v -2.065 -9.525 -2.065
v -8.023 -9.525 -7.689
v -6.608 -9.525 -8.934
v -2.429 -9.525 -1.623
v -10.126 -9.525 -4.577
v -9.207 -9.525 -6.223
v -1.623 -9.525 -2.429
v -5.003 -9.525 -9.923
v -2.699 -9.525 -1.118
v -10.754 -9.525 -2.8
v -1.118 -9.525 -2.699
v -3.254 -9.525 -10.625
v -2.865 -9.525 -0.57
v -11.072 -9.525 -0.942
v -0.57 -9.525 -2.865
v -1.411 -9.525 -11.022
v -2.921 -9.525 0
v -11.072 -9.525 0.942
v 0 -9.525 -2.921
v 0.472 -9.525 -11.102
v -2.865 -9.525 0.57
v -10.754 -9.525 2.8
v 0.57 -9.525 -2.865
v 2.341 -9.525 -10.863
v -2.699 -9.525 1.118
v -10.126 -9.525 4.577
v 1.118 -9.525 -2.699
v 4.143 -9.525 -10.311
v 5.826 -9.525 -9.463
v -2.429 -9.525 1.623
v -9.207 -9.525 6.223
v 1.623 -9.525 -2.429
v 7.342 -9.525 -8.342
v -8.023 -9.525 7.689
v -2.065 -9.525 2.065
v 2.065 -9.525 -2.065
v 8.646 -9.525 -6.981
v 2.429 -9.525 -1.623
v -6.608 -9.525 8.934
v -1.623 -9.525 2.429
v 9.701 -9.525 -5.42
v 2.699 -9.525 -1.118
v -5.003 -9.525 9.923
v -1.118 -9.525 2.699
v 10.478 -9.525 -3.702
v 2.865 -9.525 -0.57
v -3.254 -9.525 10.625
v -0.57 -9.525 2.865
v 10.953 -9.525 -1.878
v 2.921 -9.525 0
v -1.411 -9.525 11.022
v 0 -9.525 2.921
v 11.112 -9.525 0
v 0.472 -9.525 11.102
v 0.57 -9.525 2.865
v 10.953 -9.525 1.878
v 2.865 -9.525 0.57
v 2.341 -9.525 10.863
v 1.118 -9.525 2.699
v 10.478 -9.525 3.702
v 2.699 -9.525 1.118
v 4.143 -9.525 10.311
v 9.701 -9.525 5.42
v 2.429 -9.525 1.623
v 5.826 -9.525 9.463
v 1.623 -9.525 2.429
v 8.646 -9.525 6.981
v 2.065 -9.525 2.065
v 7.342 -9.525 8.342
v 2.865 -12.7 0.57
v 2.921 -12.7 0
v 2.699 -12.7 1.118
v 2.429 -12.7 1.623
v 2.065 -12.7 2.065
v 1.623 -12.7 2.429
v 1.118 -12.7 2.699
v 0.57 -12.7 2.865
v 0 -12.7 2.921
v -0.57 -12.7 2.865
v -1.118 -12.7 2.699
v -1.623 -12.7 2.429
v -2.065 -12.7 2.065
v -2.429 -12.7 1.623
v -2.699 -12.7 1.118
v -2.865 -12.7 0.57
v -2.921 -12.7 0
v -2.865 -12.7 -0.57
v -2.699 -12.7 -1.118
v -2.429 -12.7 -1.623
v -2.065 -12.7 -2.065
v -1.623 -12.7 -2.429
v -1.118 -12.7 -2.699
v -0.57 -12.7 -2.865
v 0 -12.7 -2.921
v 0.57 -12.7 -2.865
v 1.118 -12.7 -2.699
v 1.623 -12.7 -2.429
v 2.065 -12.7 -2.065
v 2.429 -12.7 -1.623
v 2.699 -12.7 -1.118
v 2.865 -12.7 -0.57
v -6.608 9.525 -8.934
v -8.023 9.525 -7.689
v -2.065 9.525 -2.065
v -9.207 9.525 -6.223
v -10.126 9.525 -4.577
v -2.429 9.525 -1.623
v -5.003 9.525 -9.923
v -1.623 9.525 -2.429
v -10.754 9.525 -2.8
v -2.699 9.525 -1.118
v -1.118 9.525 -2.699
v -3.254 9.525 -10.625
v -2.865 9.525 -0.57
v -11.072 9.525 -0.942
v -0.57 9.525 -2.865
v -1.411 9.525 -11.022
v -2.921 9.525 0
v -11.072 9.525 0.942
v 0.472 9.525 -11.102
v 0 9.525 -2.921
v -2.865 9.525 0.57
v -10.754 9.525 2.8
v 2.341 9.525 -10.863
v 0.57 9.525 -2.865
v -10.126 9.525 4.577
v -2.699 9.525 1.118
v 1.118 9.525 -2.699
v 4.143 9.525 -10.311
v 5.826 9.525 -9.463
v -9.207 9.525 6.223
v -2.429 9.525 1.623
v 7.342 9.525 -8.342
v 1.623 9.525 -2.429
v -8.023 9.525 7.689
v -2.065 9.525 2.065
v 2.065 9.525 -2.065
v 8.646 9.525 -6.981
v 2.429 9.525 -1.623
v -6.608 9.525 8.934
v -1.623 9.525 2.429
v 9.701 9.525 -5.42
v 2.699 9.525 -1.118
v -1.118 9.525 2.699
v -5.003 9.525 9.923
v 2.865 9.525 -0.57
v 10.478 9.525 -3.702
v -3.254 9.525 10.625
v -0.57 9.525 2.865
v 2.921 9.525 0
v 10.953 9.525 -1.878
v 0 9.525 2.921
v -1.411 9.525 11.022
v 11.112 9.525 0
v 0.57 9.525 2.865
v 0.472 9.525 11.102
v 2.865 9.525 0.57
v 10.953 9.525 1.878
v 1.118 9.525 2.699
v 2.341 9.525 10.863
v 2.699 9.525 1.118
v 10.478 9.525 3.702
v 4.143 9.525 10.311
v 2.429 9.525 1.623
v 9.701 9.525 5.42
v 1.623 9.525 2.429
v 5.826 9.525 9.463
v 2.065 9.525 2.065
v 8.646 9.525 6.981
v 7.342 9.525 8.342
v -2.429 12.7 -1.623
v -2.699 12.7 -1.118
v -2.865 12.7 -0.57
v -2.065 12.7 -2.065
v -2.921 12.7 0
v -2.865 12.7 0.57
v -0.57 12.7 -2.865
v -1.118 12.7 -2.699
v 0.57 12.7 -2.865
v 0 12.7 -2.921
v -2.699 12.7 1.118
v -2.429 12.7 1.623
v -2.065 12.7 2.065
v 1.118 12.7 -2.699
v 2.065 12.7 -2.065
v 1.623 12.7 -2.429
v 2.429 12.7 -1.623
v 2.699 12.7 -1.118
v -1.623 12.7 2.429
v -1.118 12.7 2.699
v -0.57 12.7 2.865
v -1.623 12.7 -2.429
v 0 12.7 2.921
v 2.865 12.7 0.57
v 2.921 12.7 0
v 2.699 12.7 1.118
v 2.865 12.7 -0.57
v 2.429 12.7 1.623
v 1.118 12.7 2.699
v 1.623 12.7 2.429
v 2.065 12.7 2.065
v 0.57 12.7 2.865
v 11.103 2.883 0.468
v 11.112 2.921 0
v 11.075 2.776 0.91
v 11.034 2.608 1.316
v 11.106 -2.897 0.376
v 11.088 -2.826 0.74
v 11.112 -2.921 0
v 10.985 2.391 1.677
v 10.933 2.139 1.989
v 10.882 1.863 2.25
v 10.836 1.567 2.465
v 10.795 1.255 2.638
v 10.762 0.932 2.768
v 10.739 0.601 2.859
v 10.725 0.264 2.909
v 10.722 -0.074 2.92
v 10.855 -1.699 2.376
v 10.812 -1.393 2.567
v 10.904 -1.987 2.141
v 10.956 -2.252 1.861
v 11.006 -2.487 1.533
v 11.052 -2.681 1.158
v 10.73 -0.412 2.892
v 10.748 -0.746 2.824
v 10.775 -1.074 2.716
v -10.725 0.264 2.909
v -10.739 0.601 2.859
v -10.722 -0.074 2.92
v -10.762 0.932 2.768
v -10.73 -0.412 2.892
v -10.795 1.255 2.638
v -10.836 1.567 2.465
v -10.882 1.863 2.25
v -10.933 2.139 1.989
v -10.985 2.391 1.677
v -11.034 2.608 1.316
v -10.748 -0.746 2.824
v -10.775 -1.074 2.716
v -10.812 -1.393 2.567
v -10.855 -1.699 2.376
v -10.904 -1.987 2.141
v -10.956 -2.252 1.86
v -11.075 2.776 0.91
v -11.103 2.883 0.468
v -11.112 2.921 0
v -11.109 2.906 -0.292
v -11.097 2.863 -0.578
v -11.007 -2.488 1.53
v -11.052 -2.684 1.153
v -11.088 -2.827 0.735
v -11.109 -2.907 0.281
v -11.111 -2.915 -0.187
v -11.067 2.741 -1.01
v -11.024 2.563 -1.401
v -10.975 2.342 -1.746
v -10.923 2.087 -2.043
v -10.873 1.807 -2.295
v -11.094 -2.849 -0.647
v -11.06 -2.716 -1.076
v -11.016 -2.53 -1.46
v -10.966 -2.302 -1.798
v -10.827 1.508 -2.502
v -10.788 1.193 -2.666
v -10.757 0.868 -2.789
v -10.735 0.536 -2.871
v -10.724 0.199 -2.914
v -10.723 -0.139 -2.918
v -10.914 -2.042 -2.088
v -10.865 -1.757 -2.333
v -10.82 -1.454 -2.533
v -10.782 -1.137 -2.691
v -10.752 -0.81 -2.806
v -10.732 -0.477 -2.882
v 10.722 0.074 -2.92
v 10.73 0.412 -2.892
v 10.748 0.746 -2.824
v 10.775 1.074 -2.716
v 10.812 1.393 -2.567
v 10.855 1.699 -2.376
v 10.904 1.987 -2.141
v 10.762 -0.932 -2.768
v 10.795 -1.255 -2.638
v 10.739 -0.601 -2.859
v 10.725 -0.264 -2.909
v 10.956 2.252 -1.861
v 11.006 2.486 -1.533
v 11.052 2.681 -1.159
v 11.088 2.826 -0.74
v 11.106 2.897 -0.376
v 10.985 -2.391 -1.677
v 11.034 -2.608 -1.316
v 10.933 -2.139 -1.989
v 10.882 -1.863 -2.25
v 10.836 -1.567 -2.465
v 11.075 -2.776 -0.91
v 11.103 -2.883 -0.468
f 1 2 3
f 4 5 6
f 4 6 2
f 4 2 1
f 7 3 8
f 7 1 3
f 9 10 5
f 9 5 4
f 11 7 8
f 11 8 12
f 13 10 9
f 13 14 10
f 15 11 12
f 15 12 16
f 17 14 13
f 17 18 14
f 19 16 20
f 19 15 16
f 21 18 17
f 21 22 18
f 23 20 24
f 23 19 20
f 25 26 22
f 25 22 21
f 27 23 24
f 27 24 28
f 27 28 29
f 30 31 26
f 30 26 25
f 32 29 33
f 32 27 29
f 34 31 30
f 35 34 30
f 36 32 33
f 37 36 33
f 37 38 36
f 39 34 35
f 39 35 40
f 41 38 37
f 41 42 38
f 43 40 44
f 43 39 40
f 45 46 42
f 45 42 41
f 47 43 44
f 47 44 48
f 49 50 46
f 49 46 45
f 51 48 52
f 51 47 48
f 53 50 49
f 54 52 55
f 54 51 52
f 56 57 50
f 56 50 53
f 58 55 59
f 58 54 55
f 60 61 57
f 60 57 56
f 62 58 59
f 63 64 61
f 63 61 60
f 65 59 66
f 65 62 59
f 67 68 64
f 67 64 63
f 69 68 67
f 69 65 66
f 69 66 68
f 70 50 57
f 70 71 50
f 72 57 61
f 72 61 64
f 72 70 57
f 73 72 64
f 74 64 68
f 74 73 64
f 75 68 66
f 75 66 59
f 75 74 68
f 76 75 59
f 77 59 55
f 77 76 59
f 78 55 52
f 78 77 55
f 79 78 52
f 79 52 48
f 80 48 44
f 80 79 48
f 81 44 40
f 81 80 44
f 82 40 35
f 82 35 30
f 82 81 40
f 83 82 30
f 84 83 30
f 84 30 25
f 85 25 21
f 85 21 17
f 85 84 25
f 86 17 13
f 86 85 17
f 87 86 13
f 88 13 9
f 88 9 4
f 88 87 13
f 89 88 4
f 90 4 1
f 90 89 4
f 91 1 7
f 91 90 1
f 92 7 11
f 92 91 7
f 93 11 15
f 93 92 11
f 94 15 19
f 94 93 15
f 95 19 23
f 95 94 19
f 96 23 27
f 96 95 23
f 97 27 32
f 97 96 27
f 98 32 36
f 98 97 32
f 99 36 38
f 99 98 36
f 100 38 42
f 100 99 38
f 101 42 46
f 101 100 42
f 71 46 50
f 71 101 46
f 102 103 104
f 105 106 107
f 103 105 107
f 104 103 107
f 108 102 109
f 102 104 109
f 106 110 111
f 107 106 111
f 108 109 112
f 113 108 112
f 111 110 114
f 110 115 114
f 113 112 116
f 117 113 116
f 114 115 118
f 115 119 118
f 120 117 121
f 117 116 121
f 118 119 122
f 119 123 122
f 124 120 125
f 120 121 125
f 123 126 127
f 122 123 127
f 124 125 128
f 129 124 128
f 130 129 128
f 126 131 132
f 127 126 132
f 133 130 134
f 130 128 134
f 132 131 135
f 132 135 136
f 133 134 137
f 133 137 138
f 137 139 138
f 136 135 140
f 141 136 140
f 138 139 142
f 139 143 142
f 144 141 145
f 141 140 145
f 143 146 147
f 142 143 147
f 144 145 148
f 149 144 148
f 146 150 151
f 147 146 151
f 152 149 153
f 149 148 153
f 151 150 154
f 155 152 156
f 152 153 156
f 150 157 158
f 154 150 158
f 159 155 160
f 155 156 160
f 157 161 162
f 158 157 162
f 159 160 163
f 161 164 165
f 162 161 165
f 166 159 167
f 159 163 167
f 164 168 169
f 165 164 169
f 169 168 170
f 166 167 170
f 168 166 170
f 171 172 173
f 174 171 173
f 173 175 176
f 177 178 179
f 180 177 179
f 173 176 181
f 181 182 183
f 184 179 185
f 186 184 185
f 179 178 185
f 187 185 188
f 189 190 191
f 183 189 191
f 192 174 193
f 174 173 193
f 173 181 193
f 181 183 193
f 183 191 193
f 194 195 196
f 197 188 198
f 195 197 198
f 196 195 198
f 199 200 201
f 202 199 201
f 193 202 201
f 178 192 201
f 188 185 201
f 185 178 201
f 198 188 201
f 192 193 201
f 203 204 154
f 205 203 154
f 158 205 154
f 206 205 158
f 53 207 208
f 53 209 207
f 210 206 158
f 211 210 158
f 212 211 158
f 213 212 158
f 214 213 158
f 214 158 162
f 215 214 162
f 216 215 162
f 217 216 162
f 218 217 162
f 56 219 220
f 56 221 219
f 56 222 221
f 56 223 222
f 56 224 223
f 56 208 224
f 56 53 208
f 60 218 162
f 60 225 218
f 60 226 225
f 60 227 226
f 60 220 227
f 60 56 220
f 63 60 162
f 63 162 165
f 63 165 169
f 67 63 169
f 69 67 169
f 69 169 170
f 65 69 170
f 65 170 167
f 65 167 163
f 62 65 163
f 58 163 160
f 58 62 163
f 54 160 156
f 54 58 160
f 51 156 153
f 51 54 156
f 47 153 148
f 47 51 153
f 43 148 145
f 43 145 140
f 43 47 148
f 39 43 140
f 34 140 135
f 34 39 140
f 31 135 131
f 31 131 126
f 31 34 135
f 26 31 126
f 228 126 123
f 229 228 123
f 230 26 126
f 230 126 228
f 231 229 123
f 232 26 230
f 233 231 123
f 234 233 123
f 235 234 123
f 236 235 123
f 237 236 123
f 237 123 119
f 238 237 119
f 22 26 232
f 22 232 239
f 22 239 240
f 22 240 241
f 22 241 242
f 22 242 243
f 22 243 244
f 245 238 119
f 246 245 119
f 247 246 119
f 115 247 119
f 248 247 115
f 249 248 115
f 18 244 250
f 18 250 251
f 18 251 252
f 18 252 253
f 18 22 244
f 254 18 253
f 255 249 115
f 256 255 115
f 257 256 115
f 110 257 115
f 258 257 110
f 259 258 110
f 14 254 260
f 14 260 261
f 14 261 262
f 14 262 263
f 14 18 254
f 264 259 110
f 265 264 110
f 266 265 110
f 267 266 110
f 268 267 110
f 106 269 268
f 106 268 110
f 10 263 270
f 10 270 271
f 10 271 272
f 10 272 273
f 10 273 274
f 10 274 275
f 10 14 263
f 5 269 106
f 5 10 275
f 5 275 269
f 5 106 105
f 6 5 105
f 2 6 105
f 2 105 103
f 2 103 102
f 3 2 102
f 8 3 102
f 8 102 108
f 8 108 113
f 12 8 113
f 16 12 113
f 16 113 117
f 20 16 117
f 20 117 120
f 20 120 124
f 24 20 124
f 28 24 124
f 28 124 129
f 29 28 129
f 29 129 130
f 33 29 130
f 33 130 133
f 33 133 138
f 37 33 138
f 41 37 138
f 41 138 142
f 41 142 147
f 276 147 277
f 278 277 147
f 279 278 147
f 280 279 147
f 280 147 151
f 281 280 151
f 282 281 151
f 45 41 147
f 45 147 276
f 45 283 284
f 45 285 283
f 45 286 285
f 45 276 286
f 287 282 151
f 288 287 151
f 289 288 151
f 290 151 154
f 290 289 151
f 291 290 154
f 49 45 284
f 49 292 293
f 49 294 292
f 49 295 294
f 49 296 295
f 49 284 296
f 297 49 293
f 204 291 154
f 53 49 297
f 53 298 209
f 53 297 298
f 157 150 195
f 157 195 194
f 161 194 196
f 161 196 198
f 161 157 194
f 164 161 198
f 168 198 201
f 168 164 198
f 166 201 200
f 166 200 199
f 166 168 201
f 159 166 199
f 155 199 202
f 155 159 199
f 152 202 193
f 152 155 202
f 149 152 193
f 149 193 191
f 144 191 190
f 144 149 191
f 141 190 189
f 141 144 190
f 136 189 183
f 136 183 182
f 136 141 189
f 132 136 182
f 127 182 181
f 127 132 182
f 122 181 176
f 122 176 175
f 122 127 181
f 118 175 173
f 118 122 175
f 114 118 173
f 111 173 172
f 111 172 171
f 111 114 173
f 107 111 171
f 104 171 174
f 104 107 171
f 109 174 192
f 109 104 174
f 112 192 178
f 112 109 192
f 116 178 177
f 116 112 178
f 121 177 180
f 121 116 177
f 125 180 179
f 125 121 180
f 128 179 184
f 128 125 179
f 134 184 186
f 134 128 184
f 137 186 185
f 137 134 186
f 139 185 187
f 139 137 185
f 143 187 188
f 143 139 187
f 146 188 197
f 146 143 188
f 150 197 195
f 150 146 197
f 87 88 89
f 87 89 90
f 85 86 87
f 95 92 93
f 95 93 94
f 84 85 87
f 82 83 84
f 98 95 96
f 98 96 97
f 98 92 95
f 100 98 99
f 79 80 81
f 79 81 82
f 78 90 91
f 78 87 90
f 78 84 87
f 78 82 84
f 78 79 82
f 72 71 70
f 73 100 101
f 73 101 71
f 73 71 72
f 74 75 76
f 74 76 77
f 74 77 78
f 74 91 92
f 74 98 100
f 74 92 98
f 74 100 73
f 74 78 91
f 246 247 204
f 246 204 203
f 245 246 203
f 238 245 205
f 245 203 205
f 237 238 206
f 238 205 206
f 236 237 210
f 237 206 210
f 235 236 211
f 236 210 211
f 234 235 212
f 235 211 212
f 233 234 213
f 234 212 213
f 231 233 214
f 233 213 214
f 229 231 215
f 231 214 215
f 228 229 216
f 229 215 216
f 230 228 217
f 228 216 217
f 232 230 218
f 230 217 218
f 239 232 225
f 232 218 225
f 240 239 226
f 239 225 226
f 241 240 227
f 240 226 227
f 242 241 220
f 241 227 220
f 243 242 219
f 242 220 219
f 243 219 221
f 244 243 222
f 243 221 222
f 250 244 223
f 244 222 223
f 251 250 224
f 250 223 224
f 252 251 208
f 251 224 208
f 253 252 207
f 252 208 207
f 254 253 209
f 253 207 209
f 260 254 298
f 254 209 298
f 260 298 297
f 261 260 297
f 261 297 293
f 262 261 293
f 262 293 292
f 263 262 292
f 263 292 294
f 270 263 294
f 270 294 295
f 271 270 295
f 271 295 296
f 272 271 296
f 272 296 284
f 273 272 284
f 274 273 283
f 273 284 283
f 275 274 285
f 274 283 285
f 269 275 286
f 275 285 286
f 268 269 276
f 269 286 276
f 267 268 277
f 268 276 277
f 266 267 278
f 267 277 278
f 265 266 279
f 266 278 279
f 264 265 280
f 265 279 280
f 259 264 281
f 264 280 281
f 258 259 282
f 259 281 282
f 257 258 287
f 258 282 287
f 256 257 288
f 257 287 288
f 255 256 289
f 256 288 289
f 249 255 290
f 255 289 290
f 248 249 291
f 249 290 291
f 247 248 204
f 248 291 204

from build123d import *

# Parameters (mm, degrees)
F0_R     = 11.1125
F0_R_2   = 2.921
F1_DEPTH = 9.525
F2_DEPTH = 12.7
F3_R     = 2.921
F4_DEPTH = 27.813


with BuildPart() as f1:
    # F0 (on Front) → F1 (new body, symmetric)
    with BuildSketch(Plane.XZ):
        Circle(F0_R)
        Circle(F0_R_2, mode=Mode.SUBTRACT)
    extrude(amount=F1_DEPTH, both=True)

    # F0 (on Front) → F2 (join, symmetric)
    with BuildSketch(Plane.XZ):
        Circle(F0_R_2)
    extrude(amount=F2_DEPTH, both=True)

    # F3 (on Right) → F4 (cut, symmetric)
    with BuildSketch(Plane.YZ):
        Circle(F3_R)
    extrude(amount=F4_DEPTH, both=True, mode=Mode.SUBTRACT)


solid = f1.part
